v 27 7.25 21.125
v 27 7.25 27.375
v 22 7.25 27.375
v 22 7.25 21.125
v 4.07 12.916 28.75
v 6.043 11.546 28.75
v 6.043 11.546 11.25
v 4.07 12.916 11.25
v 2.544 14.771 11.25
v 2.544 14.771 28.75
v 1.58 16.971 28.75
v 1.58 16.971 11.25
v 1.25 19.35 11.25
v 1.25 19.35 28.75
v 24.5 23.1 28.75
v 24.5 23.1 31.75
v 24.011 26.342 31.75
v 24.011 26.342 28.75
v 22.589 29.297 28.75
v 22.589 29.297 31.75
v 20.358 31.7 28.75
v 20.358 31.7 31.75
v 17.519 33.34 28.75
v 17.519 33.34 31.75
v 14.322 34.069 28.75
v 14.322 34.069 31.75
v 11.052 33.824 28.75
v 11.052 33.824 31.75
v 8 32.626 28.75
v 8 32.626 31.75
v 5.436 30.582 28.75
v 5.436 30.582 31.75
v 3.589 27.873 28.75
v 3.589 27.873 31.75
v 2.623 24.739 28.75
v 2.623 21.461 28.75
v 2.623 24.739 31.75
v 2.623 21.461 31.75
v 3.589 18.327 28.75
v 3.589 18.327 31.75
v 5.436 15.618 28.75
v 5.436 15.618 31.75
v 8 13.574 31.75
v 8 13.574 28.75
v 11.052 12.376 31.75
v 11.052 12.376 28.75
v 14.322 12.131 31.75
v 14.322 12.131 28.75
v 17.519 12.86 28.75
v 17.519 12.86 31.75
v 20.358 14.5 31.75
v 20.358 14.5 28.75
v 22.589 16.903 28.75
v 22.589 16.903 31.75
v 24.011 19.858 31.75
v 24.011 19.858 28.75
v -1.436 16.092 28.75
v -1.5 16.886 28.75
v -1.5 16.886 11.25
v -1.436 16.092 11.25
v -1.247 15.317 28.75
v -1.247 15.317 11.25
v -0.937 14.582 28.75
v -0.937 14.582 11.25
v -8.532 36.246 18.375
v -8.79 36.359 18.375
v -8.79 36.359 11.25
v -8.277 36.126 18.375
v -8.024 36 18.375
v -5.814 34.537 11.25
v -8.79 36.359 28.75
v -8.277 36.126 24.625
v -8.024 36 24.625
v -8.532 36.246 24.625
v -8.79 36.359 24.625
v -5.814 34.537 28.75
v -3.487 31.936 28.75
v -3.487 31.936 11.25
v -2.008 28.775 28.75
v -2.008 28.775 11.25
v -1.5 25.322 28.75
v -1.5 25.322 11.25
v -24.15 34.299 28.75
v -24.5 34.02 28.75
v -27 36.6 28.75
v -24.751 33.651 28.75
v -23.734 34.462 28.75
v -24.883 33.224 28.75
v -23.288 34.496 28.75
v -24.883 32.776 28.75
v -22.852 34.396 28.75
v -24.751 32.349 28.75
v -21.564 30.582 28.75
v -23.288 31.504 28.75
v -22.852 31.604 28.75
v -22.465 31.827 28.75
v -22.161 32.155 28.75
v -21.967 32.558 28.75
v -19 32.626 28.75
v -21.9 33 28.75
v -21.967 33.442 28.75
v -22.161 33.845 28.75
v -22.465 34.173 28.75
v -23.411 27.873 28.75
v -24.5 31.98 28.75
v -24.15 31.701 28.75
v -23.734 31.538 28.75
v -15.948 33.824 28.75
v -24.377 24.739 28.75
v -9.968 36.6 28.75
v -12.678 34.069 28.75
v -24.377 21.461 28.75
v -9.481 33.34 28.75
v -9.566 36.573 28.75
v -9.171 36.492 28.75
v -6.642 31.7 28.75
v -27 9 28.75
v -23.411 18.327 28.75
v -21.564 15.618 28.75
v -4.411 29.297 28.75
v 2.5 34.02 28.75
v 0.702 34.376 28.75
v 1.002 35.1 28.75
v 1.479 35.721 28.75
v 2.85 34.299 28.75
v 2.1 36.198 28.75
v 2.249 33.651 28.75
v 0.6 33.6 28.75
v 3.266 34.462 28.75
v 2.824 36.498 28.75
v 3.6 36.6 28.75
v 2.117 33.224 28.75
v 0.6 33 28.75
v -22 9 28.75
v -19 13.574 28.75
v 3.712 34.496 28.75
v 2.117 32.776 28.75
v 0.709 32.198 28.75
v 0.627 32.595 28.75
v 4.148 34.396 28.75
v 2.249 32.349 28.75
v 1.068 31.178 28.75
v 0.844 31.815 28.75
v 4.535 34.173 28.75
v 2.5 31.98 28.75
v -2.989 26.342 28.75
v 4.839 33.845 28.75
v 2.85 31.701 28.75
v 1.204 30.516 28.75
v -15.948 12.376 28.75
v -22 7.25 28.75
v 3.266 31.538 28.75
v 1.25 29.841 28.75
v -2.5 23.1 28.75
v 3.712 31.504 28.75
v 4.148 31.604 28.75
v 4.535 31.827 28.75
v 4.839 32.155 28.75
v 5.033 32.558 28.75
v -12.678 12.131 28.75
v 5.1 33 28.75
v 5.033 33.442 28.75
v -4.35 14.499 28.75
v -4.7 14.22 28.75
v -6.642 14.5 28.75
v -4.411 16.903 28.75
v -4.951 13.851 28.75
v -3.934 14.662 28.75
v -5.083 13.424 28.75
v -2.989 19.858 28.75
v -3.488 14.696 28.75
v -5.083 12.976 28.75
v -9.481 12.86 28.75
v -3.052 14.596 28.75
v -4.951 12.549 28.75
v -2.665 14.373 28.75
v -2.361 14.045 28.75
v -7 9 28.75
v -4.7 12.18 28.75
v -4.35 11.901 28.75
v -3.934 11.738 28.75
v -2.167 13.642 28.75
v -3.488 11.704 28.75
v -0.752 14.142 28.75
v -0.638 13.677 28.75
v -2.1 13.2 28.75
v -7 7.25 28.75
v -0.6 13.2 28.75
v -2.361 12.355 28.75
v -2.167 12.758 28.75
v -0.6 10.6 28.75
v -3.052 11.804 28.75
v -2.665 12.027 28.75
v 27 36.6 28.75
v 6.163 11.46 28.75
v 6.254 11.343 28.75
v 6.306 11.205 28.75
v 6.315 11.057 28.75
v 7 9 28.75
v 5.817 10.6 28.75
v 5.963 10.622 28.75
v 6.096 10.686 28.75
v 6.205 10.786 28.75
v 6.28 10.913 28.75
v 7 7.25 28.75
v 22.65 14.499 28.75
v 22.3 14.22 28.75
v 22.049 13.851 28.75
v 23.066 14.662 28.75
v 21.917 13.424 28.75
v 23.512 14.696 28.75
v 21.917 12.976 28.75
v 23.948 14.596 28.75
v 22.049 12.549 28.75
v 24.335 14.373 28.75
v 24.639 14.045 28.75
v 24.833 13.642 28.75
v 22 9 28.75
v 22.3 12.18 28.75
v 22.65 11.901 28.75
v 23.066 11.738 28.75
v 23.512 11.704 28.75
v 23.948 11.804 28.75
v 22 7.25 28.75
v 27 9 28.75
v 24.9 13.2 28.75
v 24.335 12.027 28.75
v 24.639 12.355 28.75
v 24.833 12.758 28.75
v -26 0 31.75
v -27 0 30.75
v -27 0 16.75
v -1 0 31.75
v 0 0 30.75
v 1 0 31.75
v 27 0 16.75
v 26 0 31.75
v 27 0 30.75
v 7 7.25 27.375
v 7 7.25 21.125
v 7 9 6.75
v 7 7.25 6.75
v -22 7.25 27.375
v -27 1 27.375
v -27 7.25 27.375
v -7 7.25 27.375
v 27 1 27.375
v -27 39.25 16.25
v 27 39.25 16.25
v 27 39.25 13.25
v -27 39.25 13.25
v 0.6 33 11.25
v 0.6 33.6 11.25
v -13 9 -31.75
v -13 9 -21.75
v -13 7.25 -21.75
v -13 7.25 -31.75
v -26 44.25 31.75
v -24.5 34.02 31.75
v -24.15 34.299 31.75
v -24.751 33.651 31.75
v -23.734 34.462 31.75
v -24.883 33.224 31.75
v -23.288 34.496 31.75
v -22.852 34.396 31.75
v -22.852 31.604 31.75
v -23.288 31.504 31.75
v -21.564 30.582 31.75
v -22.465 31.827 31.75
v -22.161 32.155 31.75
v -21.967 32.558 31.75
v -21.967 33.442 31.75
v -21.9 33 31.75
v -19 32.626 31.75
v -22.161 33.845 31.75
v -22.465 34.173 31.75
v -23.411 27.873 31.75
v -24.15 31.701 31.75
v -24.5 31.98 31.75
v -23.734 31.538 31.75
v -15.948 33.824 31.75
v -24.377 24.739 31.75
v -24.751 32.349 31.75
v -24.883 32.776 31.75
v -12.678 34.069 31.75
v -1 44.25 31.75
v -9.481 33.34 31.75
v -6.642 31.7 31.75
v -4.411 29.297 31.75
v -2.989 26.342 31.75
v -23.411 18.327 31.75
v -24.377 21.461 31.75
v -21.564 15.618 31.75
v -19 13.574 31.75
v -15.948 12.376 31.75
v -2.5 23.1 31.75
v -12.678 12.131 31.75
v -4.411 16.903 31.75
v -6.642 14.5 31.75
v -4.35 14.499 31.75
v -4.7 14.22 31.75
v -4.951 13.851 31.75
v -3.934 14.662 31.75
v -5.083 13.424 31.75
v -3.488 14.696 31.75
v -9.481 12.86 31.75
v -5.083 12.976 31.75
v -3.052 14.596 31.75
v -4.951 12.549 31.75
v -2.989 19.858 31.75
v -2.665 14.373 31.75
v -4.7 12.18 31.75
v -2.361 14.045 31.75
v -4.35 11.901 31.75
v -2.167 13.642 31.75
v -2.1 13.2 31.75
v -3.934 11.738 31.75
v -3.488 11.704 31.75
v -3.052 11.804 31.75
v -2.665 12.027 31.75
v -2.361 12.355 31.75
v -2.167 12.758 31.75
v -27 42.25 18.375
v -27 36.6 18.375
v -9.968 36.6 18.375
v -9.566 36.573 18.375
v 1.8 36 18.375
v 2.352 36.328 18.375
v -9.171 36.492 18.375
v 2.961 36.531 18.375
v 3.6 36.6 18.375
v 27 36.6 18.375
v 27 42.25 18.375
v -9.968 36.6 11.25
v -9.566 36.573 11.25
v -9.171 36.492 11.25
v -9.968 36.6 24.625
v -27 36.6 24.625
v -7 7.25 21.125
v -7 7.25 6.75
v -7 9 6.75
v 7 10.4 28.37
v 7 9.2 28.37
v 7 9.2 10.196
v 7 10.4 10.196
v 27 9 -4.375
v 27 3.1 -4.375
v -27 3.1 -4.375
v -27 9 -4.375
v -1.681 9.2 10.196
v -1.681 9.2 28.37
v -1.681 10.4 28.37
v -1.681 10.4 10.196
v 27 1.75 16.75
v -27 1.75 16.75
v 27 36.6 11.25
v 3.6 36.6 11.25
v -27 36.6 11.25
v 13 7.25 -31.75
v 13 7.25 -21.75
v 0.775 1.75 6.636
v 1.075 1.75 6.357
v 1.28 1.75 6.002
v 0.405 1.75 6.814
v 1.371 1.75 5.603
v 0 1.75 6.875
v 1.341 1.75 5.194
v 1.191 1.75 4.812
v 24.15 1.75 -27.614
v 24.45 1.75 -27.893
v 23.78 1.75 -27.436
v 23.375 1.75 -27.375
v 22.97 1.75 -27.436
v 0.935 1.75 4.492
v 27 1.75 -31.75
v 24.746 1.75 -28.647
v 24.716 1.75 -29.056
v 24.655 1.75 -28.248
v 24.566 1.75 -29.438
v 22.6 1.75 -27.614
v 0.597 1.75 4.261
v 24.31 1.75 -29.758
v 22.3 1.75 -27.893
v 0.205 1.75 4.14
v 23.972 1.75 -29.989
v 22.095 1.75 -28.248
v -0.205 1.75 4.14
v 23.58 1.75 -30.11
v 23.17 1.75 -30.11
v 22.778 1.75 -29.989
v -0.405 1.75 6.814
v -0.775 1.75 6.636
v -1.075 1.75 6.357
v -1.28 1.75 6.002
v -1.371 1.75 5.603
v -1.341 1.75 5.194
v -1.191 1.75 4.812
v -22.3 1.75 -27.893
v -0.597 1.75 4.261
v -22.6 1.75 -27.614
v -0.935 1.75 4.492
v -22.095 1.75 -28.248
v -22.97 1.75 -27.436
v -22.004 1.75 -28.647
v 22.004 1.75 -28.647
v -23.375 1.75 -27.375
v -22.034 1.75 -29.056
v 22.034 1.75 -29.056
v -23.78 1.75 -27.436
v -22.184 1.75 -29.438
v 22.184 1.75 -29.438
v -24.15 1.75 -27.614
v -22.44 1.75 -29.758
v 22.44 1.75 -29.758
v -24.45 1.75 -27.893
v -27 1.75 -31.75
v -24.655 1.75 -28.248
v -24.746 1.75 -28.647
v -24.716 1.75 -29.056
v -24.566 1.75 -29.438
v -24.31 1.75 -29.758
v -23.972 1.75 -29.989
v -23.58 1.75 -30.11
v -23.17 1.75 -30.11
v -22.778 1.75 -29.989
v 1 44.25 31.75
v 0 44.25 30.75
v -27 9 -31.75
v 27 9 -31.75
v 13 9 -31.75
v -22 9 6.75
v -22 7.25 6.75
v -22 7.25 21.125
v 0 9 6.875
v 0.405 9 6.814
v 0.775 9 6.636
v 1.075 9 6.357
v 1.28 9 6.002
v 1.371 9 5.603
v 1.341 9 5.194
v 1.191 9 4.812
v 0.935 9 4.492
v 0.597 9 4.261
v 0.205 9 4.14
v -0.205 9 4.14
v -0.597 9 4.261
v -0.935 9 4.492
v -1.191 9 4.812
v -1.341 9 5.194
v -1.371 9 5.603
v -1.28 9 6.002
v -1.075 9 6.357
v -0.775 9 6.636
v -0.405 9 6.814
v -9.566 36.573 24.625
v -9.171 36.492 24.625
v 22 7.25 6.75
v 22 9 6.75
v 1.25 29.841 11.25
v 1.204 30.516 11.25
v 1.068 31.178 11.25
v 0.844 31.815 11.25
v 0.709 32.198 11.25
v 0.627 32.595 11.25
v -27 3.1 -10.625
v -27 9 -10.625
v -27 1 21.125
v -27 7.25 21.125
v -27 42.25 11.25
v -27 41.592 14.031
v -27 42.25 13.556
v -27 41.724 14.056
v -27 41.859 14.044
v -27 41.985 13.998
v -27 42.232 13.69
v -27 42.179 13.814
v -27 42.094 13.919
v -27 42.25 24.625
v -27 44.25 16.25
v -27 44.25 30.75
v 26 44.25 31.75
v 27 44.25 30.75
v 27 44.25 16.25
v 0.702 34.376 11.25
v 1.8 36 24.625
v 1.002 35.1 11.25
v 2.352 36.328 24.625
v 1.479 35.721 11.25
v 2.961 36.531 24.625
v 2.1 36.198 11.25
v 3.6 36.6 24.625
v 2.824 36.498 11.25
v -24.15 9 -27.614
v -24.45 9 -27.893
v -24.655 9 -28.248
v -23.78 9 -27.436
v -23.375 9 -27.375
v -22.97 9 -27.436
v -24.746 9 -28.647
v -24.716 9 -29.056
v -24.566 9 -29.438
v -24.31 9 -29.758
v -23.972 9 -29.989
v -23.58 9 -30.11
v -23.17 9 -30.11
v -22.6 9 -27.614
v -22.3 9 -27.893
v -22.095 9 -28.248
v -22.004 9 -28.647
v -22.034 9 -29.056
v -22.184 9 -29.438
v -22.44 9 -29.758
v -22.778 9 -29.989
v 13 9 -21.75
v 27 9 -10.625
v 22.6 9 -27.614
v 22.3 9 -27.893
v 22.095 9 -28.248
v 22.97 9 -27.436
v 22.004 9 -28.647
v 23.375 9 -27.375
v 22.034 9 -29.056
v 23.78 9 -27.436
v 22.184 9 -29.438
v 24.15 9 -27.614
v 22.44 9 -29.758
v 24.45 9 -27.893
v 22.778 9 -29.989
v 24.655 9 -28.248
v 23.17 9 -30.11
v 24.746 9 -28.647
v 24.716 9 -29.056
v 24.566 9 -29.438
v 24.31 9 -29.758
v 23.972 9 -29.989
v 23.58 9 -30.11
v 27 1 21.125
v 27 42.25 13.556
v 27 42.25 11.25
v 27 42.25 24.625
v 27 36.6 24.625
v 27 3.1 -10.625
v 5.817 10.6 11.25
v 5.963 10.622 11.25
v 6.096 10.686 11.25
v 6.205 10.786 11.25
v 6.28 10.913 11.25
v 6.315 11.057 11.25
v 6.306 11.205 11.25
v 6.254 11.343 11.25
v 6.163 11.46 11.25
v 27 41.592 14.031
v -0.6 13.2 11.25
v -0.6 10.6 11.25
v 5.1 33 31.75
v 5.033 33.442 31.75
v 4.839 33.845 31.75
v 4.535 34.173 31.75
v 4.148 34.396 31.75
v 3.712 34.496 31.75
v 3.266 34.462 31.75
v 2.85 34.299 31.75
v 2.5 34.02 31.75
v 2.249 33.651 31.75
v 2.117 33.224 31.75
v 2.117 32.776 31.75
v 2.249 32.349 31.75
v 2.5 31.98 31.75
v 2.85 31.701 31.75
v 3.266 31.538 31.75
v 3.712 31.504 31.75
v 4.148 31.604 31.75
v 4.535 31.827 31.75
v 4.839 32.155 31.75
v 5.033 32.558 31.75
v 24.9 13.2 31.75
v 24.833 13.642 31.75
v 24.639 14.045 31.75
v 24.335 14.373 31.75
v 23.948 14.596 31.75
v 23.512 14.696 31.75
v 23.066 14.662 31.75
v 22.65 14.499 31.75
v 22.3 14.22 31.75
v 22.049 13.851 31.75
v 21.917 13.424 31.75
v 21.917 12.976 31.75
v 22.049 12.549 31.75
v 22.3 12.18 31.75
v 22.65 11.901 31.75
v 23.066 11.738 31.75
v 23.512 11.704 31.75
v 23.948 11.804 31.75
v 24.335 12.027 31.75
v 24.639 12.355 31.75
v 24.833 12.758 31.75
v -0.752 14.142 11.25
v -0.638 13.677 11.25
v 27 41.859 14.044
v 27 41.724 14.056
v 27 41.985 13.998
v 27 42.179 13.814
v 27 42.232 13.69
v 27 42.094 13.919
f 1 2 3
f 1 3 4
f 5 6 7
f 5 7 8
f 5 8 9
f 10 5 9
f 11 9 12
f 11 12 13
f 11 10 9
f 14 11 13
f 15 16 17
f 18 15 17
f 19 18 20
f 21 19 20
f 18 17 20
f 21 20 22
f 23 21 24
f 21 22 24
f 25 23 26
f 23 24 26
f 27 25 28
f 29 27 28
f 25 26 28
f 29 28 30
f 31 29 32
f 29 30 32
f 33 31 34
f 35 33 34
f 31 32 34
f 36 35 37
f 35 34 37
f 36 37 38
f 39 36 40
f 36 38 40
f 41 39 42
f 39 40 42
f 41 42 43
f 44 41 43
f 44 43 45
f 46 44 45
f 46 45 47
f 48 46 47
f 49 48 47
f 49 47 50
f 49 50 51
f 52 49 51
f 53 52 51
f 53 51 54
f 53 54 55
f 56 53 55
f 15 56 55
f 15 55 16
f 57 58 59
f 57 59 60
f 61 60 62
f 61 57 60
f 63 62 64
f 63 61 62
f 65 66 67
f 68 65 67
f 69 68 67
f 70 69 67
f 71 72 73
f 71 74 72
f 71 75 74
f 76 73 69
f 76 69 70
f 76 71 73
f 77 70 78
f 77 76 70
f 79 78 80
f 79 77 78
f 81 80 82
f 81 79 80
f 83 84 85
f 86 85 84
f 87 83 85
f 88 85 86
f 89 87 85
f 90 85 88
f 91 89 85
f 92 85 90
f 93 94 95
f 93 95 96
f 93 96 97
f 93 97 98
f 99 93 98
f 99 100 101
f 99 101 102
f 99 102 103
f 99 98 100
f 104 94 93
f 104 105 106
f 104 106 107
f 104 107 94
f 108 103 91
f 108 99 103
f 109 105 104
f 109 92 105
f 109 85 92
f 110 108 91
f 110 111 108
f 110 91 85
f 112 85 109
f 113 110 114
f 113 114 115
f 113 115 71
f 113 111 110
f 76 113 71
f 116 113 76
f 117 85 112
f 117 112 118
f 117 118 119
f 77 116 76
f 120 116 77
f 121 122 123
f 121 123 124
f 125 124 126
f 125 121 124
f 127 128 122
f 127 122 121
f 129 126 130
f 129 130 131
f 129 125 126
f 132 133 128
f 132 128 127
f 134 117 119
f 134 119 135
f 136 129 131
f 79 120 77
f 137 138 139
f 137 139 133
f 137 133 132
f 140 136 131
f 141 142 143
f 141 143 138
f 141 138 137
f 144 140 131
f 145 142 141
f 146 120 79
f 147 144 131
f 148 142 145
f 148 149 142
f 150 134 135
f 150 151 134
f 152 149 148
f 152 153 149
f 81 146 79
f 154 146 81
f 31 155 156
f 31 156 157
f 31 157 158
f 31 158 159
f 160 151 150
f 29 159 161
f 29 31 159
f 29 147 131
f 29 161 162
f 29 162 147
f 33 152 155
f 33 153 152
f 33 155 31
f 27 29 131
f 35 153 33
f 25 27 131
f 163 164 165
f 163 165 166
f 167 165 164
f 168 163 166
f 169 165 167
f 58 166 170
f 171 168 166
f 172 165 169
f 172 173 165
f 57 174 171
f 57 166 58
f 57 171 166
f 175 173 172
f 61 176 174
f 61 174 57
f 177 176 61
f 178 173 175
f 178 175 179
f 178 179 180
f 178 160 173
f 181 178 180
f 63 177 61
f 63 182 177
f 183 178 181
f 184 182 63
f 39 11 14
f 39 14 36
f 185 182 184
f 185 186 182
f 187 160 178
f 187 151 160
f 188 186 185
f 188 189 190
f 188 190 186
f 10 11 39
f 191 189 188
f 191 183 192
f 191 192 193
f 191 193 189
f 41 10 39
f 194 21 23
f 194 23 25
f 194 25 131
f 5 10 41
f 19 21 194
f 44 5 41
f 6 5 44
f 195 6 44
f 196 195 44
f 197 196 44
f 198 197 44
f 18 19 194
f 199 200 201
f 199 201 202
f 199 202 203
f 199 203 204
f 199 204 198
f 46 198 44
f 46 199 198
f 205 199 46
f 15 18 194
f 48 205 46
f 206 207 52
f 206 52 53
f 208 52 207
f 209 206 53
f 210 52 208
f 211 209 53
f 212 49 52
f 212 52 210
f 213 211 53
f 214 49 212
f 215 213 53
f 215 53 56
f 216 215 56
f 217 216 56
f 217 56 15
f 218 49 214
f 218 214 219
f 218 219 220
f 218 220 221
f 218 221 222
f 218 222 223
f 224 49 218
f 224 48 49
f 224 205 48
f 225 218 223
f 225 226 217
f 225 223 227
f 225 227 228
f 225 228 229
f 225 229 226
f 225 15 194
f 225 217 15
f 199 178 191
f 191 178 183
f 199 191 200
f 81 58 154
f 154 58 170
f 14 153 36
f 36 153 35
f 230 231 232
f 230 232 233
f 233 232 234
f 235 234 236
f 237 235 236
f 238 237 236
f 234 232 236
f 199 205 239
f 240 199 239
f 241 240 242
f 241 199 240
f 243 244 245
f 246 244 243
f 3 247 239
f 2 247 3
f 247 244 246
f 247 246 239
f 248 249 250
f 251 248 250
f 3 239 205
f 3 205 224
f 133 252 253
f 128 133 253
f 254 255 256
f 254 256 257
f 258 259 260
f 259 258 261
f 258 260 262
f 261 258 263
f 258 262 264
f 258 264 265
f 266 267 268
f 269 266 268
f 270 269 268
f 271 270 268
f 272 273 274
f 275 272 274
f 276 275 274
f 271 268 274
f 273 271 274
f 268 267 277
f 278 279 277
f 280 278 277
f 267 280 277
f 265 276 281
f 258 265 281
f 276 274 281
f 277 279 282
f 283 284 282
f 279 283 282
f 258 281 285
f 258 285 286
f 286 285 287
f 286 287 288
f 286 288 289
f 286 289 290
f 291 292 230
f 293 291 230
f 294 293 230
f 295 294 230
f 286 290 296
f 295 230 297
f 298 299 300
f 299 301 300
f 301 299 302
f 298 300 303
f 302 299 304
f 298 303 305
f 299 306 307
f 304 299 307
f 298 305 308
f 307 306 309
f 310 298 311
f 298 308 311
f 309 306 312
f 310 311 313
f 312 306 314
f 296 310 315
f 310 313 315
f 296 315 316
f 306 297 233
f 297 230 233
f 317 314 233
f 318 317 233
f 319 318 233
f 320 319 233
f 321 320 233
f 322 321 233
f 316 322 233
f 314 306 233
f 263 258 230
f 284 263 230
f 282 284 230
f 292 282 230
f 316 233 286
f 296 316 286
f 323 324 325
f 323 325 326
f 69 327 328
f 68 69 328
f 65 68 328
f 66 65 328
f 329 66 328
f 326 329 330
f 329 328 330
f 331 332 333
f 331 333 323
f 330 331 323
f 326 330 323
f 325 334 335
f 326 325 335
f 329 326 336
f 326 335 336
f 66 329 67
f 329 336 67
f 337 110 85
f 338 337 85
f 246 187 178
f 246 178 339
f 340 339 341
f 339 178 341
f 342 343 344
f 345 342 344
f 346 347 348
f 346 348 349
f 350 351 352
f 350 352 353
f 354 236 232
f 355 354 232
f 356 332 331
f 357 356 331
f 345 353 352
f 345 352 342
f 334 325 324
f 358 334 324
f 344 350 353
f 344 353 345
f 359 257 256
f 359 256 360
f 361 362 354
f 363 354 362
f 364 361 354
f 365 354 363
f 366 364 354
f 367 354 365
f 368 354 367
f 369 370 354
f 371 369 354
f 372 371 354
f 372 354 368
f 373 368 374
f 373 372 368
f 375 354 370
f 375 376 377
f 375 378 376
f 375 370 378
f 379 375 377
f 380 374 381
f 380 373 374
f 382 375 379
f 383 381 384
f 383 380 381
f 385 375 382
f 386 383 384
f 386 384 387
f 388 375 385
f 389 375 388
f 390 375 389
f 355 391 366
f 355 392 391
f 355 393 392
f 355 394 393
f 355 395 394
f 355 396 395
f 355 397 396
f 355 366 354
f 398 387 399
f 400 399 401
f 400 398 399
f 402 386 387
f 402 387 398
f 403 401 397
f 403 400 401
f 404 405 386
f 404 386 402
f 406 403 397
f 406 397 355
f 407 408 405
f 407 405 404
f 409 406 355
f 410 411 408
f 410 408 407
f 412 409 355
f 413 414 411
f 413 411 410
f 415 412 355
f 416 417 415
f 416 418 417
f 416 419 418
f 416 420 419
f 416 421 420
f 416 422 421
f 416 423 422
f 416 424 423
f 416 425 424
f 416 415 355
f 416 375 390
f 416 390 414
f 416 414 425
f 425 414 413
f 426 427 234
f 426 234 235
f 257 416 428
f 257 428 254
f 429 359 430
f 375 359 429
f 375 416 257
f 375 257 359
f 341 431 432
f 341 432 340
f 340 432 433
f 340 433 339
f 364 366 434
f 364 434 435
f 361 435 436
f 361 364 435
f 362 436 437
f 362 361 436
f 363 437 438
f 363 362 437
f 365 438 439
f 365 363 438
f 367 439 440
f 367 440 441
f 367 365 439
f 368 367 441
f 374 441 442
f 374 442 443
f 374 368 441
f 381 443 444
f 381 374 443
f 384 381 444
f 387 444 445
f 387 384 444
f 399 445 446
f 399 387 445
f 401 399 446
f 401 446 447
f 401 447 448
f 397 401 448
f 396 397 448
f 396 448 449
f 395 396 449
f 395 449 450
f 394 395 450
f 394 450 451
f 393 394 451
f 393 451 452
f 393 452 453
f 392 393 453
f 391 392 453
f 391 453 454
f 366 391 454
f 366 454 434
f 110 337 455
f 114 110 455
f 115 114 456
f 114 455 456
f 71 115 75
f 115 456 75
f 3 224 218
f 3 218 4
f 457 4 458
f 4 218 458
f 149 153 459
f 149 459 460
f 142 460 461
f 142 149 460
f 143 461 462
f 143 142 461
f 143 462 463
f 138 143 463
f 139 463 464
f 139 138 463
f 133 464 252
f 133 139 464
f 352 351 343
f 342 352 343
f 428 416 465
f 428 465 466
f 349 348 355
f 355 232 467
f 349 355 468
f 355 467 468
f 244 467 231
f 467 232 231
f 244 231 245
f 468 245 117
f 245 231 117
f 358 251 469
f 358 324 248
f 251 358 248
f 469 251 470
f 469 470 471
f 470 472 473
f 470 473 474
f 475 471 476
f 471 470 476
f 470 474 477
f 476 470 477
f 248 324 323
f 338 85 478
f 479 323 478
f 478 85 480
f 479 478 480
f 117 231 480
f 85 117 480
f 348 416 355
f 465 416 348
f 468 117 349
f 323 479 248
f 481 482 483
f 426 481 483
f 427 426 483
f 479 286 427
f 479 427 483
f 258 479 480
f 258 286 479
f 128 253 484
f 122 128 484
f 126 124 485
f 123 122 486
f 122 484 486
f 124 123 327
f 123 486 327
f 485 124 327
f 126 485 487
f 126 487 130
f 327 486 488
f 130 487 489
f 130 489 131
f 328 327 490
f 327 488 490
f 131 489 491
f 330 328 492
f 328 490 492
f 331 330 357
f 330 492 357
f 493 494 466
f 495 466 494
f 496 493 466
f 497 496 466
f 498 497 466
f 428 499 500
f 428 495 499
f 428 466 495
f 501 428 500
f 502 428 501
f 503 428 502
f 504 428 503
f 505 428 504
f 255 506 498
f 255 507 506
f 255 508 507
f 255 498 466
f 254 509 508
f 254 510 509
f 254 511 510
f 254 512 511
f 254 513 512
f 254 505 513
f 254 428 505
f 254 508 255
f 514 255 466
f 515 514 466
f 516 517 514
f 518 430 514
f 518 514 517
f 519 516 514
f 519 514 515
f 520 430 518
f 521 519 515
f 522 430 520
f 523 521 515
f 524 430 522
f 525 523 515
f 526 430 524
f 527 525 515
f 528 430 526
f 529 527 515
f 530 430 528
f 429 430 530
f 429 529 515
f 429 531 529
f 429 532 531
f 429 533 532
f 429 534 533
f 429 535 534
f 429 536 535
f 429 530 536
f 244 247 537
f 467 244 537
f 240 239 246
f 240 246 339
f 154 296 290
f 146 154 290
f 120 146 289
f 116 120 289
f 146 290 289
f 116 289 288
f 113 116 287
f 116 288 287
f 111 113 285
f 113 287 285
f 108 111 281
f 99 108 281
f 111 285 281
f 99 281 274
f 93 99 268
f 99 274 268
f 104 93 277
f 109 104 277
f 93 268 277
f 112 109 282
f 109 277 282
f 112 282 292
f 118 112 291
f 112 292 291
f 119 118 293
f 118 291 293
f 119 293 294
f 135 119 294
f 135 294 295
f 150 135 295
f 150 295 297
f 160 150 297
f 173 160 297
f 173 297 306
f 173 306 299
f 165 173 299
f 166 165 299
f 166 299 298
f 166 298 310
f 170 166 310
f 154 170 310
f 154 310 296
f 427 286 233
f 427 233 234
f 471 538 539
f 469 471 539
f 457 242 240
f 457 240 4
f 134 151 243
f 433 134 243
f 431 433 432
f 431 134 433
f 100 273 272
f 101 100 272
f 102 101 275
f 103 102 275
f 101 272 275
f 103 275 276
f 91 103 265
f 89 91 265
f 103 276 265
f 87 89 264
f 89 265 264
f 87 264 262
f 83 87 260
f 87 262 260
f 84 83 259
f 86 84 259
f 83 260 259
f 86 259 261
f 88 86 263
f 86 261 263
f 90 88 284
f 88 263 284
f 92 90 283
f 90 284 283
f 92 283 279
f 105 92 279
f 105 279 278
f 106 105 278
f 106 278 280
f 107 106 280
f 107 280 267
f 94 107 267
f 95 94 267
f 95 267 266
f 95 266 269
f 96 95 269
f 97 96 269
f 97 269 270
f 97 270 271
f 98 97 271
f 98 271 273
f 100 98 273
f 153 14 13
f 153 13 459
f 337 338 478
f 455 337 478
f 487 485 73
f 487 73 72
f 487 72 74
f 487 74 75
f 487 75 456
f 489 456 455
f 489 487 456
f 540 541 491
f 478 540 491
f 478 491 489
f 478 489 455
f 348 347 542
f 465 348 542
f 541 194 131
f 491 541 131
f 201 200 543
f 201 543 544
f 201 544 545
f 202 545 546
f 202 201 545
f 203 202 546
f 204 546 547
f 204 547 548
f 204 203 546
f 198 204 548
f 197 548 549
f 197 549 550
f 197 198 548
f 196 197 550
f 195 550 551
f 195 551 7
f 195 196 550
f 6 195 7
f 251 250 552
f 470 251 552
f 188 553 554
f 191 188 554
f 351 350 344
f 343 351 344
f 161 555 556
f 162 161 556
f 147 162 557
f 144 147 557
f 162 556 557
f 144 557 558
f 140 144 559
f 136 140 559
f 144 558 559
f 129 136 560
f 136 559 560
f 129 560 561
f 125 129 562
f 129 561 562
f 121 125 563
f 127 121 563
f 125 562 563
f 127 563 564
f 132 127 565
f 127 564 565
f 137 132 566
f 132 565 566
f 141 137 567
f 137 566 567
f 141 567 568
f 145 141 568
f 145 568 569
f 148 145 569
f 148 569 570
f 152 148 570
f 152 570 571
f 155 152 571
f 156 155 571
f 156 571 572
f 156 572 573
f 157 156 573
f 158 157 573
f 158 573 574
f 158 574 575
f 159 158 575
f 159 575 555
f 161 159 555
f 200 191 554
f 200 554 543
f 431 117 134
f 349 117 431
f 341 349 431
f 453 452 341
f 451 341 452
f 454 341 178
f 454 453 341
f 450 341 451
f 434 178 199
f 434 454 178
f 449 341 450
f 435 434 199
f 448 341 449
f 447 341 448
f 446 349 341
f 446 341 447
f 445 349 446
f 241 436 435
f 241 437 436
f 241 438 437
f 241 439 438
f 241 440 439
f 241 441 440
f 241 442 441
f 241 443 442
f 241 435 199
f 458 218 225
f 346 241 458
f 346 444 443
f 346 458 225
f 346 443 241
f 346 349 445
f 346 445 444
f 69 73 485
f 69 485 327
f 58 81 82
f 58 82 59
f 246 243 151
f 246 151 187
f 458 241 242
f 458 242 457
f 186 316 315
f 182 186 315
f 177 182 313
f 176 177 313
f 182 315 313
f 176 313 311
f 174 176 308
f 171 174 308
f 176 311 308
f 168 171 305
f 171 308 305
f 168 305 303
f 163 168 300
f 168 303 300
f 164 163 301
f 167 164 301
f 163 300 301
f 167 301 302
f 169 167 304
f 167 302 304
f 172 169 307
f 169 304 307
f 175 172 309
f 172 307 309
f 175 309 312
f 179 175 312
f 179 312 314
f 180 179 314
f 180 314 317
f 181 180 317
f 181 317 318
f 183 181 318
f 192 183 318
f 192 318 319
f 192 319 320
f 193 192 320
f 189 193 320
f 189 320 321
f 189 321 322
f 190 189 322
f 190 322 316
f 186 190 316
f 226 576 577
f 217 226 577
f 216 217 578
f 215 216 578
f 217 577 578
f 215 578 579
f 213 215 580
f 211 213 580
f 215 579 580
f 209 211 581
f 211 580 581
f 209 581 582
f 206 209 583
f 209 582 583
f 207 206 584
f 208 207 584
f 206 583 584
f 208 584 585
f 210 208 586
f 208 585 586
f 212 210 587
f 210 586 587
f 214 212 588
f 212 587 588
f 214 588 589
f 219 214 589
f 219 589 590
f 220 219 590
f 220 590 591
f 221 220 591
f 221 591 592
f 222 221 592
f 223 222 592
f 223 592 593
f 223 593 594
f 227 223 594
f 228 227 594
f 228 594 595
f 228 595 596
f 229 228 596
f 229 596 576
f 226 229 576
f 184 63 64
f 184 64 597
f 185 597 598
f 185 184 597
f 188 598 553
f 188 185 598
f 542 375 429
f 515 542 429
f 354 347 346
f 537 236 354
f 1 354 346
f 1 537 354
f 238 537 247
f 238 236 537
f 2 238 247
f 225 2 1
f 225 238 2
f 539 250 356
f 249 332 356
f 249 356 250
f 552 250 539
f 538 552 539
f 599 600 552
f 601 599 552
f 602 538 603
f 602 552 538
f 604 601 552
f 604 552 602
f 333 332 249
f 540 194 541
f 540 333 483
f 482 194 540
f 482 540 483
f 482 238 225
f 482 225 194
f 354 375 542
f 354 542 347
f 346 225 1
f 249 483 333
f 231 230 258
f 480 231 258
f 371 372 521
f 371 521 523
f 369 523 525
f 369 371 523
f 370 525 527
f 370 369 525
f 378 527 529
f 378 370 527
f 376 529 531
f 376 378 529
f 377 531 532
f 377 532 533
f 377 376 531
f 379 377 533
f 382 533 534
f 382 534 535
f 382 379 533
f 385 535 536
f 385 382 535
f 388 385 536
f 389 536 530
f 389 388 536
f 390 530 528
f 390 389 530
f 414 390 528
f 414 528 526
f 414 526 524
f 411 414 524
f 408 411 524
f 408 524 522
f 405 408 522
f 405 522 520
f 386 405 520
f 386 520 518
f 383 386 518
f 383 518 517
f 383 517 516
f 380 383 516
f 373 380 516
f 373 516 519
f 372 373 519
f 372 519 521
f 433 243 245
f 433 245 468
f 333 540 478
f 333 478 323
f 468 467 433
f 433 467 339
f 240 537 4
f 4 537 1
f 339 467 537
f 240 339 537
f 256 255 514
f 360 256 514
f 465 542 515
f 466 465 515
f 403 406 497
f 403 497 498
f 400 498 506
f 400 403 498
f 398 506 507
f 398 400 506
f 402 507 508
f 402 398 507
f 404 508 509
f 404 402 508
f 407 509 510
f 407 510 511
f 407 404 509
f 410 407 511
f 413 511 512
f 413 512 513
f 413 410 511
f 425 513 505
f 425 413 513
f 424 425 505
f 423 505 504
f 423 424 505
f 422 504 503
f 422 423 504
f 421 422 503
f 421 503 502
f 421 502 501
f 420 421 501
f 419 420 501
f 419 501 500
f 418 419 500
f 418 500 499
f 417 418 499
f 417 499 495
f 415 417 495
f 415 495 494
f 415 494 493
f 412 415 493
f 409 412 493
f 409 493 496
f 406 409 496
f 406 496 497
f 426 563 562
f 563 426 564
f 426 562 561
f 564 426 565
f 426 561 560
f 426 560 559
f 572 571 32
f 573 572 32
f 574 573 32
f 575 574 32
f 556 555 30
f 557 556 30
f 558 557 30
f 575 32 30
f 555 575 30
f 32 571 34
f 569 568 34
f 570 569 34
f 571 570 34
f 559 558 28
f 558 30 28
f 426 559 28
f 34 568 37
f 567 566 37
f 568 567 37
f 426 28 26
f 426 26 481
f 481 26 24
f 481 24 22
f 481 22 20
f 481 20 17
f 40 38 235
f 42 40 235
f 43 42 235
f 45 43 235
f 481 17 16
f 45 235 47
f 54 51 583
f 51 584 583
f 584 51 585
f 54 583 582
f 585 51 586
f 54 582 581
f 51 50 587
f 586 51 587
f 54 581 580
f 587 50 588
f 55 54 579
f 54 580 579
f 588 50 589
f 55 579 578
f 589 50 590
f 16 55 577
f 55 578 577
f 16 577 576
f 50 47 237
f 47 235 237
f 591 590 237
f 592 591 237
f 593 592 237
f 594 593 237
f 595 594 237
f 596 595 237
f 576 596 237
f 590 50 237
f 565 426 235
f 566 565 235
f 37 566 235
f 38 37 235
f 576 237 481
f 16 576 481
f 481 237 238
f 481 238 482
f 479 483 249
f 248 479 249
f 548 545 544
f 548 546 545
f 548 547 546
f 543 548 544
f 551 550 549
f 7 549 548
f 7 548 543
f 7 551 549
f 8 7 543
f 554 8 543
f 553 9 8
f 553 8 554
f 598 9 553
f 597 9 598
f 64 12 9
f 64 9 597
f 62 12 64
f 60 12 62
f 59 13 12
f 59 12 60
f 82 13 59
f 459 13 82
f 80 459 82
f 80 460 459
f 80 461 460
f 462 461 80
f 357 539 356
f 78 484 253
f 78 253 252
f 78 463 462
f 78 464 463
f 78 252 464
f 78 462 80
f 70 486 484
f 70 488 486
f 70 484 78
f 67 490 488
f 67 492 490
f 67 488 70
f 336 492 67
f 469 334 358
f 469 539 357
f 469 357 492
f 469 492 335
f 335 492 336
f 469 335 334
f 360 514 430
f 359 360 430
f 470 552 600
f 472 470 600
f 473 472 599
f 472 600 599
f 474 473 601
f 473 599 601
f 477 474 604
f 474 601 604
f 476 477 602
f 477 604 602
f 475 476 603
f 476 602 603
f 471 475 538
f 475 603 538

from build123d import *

# Parameters (mm, degrees)
SKETCH1_W           = 54
SKETCH1_H           = 63.5
SKETCH1_R           = 1.375
BOSS_EXTRUDE1_DEPTH = 9
SKETCH2_W           = 54
SKETCH2_H           = 3
BOSS_EXTRUDE2_DEPTH = 35.25
SKETCH3_R           = 11
SKETCH3_R_2         = 1.5
CUT_EXTRUDE1_DEPTH  = 82.9714127
SKETCH4_W           = 54
SKETCH4_H           = 48.5
CUT_EXTRUDE2_DEPTH  = 1.75
BOSS_EXTRUDE3_DEPTH = 17.5
SKETCH6_W           = 54
SKETCH6_H           = 7.65
BOSS_EXTRUDE5_DEPTH = 17.5
FILLET2_R           = 3
SKETCH8_W           = 15
SKETCH8_H           = 22
SKETCH8_W_2         = 26
SKETCH8_H_2         = 10
CUT_EXTRUDE4_DEPTH  = 1.75
SKETCH7_W           = 6.25
SKETCH7_H           = 6.25
SKETCH7_H_2         = 5.9
CUT_EXTRUDE3_DEPTH  = 77.695012876
CHAMFER2_SIZE       = 1
CUT_EXTRUDE5_DEPTH  = 61.787539842
CUT_EXTRUDE6_DEPTH  = 77.695012876
BOSS_EXTRUDE6_START = 0.2
SKETCH13_W          = 8.680886663
SKETCH13_H          = 18.174047098
BOSS_EXTRUDE6_DEPTH = 1.2


with BuildPart() as part:
    # Sketch1 → Boss-Extrude1 (new body)
    with BuildSketch(Plane(origin=(0, 0, 0), x_dir=(1, 0, 0), z_dir=(0, 1, 0))):
        Rectangle(SKETCH1_W, SKETCH1_H)
        with Locations(Location((-23.375, 28.75, 0), (0, 0, 270))):
            Circle(SKETCH1_R, mode=Mode.SUBTRACT)
        with Locations(Location((23.375, 28.75, 0), (0, 0, 270))):
            Circle(SKETCH1_R, mode=Mode.SUBTRACT)
        with Locations(Location((0, -5.5, 0), (0, 0, 270))):
            Circle(SKETCH1_R, mode=Mode.SUBTRACT)
    extrude(amount=BOSS_EXTRUDE1_DEPTH)

    # Sketch2 → Boss-Extrude2 (add)
    with BuildSketch(Plane(origin=(0, 9, 0), x_dir=(1, 0, 0), z_dir=(0, 1, 0))):
        with Locations((0, -30.25)):
            Rectangle(SKETCH2_W, SKETCH2_H)
    extrude(amount=BOSS_EXTRUDE2_DEPTH)

    # Sketch3 → Cut-Extrude1 (cut, through all)
    with BuildSketch(Plane.XY.offset(31.75)):
        with Locations((-13.5, 23.1)):
            Circle(SKETCH3_R)
        with Locations((13.5, 23.1)):
            Circle(SKETCH3_R)
        with Locations((-23.4, 33)):
            Circle(SKETCH3_R_2)
        with Locations((-3.6, 13.2)):
            Circle(SKETCH3_R_2)
        with Locations((3.6, 33)):
            Circle(SKETCH3_R_2)
        with Locations((23.4, 13.2)):
            Circle(SKETCH3_R_2)
    extrude(amount=-CUT_EXTRUDE1_DEPTH, mode=Mode.SUBTRACT)

    # Sketch4 → Cut-Extrude2 (cut)
    with BuildSketch(Plane(origin=(0, 0, 0), x_dir=(-1, 0, 0), z_dir=(0, -1, 0))):
        with Locations((0, 7.5)):
            Rectangle(SKETCH4_W, SKETCH4_H)
    extrude(amount=-CUT_EXTRUDE2_DEPTH, mode=Mode.SUBTRACT)

    # Sketch5 → Boss-Extrude3 (add)
    with BuildSketch(Plane(origin=(0, 0, 28.75), x_dir=(-1, 0, 0), z_dir=(0, 0, -1))):
        with BuildLine():
            Line((-1.25, 23.1), (-1.25, 29.841281906))
            ThreePointArc((-1.25, 29.841281906), (-1.147384506, 30.849064124), (-0.84375, 31.815480715))
            ThreePointArc((-0.84375, 31.815480715), (-0.661569296, 32.395330669), (-0.6, 33))
            Line((-0.6, 33), (-0.6, 36.6))
            Line((-0.6, 36.6), (9.4, 36.6))
            ThreePointArc((9.4, 36.6), (3.6714701, 32.206911385), (1.5, 25.322145594))
            Line((1.5, 25.322145594), (1.5, 23.1))
            Line((1.5, 23.1), (1.5, 16.886461718))
            ThreePointArc((1.5, 16.886461718), (1.357339807, 15.700607596), (0.9375, 14.582423144))
            ThreePointArc((0.9375, 14.582423144), (0.685596116, 13.911512474), (0.6, 13.2))
            Line((0.6, 13.2), (0.6, 10.6))
            Line((0.6, 10.6), (0, 10.6))
            Line((0, 10.6), (-5.816699867, 10.6))
            ThreePointArc((-5.816699867, 10.6), (-6.30299863, 10.983752361), (-6.042824199, 11.545945946))
            ThreePointArc((-6.042824199, 11.545945946), (-2.543868689, 14.770850967), (-1.25, 19.35))
            Line((-1.25, 19.35), (-1.25, 23.1))
        make_face()
    extrude(amount=BOSS_EXTRUDE3_DEPTH)

    # Sketch6 → Boss-Extrude5 (add)
    with BuildSketch(Plane(origin=(0, 0, 28.75), x_dir=(-1, 0, 0), z_dir=(0, 0, -1))):
        with Locations((0, 40.425)):
            Rectangle(SKETCH6_W, SKETCH6_H)
    extrude(amount=BOSS_EXTRUDE5_DEPTH)

    # Fillet2
    fillet2_edges = [part.edges().sort_by_distance(p)[0] for p in [
        (-9.4, 36.6, 20),
        (0.6, 36.6, 20),
    ]]
    fillet(fillet2_edges, radius=FILLET2_R)

    # Sketch8 → Cut-Extrude4 (cut)
    with BuildSketch(Plane(origin=(0, 9, 0), x_dir=(1, 0, 0), z_dir=(0, 1, 0))):
        with Locations((14.5, -17.75)):
            Rectangle(SKETCH8_W, SKETCH8_H)
        with Locations((-14.5, -17.75)):
            Rectangle(SKETCH8_W, SKETCH8_H)
        with Locations((0, 26.75)):
            Rectangle(SKETCH8_W_2, SKETCH8_H_2)
    extrude(amount=-CUT_EXTRUDE4_DEPTH, mode=Mode.SUBTRACT)

    # Sketch7 → Cut-Extrude3 (cut, through all)
    with BuildSketch(Plane(origin=(27, 0, 0), x_dir=(0, 0, -1), z_dir=(1, 0, 0))):
        with Locations((-24.25, 4.125)):
            Rectangle(SKETCH7_W, SKETCH7_H)
        with Locations((-21.5, 39.125)):
            Rectangle(SKETCH7_W, SKETCH7_H)
        with Locations((7.5, 6.05)):
            Rectangle(SKETCH7_W, SKETCH7_H_2)
    extrude(amount=-CUT_EXTRUDE3_DEPTH, mode=Mode.SUBTRACT)

    # Chamfer2
    chamfer2_edges = [part.edges().sort_by_distance(p)[0] for p in [
        (27, 22.125, 31.75),
        (-27, 22.125, 31.75),
    ]]
    chamfer(chamfer2_edges, length=CHAMFER2_SIZE)

    # Sketch9 → Cut-Extrude5 (cut, through all)
    with BuildSketch(Plane(origin=(0, 44.25, 0), x_dir=(1, 0, 0), z_dir=(0, 1, 0))):
        Polygon((-1, -31.75), (0, -30.75), (1, -31.75), align=None)
    extrude(amount=-CUT_EXTRUDE5_DEPTH, mode=Mode.SUBTRACT)

    # Sketch10 → Cut-Extrude6 (cut, through all)
    with BuildSketch(Plane(origin=(27, 0, 0), x_dir=(0, 0, -1), z_dir=(1, 0, 0))):
        with BuildLine():
            Line((-11.25, 44.25), (-16.25, 44.25))
            Line((-16.25, 44.25), (-16.25, 39.25))
            Line((-16.25, 39.25), (-13.25, 39.25))
            Line((-13.25, 39.25), (-14.030628706, 41.591886117))
            ThreePointArc((-14.030628706, 41.591886117), (-13.961908149, 42.042355142), (-13.556287057, 42.25))
            Line((-13.556287057, 42.25), (-11.25, 42.25))
            Line((-11.25, 42.25), (-11.25, 44.25))
        make_face()
    extrude(amount=-CUT_EXTRUDE6_DEPTH, mode=Mode.SUBTRACT)


with BuildPart() as body_2:
    # Sketch13 → Boss-Extrude6 (new body)
    with BuildSketch(Plane(origin=(0, 9, 0), x_dir=(1, 0, 0), z_dir=(0, 1, 0)).offset(BOSS_EXTRUDE6_START)):
        with Locations((2.659556669, -19.282754062)):
            Rectangle(SKETCH13_W, SKETCH13_H)
    extrude(amount=BOSS_EXTRUDE6_DEPTH)


solid = Compound([part.part, body_2.part])
